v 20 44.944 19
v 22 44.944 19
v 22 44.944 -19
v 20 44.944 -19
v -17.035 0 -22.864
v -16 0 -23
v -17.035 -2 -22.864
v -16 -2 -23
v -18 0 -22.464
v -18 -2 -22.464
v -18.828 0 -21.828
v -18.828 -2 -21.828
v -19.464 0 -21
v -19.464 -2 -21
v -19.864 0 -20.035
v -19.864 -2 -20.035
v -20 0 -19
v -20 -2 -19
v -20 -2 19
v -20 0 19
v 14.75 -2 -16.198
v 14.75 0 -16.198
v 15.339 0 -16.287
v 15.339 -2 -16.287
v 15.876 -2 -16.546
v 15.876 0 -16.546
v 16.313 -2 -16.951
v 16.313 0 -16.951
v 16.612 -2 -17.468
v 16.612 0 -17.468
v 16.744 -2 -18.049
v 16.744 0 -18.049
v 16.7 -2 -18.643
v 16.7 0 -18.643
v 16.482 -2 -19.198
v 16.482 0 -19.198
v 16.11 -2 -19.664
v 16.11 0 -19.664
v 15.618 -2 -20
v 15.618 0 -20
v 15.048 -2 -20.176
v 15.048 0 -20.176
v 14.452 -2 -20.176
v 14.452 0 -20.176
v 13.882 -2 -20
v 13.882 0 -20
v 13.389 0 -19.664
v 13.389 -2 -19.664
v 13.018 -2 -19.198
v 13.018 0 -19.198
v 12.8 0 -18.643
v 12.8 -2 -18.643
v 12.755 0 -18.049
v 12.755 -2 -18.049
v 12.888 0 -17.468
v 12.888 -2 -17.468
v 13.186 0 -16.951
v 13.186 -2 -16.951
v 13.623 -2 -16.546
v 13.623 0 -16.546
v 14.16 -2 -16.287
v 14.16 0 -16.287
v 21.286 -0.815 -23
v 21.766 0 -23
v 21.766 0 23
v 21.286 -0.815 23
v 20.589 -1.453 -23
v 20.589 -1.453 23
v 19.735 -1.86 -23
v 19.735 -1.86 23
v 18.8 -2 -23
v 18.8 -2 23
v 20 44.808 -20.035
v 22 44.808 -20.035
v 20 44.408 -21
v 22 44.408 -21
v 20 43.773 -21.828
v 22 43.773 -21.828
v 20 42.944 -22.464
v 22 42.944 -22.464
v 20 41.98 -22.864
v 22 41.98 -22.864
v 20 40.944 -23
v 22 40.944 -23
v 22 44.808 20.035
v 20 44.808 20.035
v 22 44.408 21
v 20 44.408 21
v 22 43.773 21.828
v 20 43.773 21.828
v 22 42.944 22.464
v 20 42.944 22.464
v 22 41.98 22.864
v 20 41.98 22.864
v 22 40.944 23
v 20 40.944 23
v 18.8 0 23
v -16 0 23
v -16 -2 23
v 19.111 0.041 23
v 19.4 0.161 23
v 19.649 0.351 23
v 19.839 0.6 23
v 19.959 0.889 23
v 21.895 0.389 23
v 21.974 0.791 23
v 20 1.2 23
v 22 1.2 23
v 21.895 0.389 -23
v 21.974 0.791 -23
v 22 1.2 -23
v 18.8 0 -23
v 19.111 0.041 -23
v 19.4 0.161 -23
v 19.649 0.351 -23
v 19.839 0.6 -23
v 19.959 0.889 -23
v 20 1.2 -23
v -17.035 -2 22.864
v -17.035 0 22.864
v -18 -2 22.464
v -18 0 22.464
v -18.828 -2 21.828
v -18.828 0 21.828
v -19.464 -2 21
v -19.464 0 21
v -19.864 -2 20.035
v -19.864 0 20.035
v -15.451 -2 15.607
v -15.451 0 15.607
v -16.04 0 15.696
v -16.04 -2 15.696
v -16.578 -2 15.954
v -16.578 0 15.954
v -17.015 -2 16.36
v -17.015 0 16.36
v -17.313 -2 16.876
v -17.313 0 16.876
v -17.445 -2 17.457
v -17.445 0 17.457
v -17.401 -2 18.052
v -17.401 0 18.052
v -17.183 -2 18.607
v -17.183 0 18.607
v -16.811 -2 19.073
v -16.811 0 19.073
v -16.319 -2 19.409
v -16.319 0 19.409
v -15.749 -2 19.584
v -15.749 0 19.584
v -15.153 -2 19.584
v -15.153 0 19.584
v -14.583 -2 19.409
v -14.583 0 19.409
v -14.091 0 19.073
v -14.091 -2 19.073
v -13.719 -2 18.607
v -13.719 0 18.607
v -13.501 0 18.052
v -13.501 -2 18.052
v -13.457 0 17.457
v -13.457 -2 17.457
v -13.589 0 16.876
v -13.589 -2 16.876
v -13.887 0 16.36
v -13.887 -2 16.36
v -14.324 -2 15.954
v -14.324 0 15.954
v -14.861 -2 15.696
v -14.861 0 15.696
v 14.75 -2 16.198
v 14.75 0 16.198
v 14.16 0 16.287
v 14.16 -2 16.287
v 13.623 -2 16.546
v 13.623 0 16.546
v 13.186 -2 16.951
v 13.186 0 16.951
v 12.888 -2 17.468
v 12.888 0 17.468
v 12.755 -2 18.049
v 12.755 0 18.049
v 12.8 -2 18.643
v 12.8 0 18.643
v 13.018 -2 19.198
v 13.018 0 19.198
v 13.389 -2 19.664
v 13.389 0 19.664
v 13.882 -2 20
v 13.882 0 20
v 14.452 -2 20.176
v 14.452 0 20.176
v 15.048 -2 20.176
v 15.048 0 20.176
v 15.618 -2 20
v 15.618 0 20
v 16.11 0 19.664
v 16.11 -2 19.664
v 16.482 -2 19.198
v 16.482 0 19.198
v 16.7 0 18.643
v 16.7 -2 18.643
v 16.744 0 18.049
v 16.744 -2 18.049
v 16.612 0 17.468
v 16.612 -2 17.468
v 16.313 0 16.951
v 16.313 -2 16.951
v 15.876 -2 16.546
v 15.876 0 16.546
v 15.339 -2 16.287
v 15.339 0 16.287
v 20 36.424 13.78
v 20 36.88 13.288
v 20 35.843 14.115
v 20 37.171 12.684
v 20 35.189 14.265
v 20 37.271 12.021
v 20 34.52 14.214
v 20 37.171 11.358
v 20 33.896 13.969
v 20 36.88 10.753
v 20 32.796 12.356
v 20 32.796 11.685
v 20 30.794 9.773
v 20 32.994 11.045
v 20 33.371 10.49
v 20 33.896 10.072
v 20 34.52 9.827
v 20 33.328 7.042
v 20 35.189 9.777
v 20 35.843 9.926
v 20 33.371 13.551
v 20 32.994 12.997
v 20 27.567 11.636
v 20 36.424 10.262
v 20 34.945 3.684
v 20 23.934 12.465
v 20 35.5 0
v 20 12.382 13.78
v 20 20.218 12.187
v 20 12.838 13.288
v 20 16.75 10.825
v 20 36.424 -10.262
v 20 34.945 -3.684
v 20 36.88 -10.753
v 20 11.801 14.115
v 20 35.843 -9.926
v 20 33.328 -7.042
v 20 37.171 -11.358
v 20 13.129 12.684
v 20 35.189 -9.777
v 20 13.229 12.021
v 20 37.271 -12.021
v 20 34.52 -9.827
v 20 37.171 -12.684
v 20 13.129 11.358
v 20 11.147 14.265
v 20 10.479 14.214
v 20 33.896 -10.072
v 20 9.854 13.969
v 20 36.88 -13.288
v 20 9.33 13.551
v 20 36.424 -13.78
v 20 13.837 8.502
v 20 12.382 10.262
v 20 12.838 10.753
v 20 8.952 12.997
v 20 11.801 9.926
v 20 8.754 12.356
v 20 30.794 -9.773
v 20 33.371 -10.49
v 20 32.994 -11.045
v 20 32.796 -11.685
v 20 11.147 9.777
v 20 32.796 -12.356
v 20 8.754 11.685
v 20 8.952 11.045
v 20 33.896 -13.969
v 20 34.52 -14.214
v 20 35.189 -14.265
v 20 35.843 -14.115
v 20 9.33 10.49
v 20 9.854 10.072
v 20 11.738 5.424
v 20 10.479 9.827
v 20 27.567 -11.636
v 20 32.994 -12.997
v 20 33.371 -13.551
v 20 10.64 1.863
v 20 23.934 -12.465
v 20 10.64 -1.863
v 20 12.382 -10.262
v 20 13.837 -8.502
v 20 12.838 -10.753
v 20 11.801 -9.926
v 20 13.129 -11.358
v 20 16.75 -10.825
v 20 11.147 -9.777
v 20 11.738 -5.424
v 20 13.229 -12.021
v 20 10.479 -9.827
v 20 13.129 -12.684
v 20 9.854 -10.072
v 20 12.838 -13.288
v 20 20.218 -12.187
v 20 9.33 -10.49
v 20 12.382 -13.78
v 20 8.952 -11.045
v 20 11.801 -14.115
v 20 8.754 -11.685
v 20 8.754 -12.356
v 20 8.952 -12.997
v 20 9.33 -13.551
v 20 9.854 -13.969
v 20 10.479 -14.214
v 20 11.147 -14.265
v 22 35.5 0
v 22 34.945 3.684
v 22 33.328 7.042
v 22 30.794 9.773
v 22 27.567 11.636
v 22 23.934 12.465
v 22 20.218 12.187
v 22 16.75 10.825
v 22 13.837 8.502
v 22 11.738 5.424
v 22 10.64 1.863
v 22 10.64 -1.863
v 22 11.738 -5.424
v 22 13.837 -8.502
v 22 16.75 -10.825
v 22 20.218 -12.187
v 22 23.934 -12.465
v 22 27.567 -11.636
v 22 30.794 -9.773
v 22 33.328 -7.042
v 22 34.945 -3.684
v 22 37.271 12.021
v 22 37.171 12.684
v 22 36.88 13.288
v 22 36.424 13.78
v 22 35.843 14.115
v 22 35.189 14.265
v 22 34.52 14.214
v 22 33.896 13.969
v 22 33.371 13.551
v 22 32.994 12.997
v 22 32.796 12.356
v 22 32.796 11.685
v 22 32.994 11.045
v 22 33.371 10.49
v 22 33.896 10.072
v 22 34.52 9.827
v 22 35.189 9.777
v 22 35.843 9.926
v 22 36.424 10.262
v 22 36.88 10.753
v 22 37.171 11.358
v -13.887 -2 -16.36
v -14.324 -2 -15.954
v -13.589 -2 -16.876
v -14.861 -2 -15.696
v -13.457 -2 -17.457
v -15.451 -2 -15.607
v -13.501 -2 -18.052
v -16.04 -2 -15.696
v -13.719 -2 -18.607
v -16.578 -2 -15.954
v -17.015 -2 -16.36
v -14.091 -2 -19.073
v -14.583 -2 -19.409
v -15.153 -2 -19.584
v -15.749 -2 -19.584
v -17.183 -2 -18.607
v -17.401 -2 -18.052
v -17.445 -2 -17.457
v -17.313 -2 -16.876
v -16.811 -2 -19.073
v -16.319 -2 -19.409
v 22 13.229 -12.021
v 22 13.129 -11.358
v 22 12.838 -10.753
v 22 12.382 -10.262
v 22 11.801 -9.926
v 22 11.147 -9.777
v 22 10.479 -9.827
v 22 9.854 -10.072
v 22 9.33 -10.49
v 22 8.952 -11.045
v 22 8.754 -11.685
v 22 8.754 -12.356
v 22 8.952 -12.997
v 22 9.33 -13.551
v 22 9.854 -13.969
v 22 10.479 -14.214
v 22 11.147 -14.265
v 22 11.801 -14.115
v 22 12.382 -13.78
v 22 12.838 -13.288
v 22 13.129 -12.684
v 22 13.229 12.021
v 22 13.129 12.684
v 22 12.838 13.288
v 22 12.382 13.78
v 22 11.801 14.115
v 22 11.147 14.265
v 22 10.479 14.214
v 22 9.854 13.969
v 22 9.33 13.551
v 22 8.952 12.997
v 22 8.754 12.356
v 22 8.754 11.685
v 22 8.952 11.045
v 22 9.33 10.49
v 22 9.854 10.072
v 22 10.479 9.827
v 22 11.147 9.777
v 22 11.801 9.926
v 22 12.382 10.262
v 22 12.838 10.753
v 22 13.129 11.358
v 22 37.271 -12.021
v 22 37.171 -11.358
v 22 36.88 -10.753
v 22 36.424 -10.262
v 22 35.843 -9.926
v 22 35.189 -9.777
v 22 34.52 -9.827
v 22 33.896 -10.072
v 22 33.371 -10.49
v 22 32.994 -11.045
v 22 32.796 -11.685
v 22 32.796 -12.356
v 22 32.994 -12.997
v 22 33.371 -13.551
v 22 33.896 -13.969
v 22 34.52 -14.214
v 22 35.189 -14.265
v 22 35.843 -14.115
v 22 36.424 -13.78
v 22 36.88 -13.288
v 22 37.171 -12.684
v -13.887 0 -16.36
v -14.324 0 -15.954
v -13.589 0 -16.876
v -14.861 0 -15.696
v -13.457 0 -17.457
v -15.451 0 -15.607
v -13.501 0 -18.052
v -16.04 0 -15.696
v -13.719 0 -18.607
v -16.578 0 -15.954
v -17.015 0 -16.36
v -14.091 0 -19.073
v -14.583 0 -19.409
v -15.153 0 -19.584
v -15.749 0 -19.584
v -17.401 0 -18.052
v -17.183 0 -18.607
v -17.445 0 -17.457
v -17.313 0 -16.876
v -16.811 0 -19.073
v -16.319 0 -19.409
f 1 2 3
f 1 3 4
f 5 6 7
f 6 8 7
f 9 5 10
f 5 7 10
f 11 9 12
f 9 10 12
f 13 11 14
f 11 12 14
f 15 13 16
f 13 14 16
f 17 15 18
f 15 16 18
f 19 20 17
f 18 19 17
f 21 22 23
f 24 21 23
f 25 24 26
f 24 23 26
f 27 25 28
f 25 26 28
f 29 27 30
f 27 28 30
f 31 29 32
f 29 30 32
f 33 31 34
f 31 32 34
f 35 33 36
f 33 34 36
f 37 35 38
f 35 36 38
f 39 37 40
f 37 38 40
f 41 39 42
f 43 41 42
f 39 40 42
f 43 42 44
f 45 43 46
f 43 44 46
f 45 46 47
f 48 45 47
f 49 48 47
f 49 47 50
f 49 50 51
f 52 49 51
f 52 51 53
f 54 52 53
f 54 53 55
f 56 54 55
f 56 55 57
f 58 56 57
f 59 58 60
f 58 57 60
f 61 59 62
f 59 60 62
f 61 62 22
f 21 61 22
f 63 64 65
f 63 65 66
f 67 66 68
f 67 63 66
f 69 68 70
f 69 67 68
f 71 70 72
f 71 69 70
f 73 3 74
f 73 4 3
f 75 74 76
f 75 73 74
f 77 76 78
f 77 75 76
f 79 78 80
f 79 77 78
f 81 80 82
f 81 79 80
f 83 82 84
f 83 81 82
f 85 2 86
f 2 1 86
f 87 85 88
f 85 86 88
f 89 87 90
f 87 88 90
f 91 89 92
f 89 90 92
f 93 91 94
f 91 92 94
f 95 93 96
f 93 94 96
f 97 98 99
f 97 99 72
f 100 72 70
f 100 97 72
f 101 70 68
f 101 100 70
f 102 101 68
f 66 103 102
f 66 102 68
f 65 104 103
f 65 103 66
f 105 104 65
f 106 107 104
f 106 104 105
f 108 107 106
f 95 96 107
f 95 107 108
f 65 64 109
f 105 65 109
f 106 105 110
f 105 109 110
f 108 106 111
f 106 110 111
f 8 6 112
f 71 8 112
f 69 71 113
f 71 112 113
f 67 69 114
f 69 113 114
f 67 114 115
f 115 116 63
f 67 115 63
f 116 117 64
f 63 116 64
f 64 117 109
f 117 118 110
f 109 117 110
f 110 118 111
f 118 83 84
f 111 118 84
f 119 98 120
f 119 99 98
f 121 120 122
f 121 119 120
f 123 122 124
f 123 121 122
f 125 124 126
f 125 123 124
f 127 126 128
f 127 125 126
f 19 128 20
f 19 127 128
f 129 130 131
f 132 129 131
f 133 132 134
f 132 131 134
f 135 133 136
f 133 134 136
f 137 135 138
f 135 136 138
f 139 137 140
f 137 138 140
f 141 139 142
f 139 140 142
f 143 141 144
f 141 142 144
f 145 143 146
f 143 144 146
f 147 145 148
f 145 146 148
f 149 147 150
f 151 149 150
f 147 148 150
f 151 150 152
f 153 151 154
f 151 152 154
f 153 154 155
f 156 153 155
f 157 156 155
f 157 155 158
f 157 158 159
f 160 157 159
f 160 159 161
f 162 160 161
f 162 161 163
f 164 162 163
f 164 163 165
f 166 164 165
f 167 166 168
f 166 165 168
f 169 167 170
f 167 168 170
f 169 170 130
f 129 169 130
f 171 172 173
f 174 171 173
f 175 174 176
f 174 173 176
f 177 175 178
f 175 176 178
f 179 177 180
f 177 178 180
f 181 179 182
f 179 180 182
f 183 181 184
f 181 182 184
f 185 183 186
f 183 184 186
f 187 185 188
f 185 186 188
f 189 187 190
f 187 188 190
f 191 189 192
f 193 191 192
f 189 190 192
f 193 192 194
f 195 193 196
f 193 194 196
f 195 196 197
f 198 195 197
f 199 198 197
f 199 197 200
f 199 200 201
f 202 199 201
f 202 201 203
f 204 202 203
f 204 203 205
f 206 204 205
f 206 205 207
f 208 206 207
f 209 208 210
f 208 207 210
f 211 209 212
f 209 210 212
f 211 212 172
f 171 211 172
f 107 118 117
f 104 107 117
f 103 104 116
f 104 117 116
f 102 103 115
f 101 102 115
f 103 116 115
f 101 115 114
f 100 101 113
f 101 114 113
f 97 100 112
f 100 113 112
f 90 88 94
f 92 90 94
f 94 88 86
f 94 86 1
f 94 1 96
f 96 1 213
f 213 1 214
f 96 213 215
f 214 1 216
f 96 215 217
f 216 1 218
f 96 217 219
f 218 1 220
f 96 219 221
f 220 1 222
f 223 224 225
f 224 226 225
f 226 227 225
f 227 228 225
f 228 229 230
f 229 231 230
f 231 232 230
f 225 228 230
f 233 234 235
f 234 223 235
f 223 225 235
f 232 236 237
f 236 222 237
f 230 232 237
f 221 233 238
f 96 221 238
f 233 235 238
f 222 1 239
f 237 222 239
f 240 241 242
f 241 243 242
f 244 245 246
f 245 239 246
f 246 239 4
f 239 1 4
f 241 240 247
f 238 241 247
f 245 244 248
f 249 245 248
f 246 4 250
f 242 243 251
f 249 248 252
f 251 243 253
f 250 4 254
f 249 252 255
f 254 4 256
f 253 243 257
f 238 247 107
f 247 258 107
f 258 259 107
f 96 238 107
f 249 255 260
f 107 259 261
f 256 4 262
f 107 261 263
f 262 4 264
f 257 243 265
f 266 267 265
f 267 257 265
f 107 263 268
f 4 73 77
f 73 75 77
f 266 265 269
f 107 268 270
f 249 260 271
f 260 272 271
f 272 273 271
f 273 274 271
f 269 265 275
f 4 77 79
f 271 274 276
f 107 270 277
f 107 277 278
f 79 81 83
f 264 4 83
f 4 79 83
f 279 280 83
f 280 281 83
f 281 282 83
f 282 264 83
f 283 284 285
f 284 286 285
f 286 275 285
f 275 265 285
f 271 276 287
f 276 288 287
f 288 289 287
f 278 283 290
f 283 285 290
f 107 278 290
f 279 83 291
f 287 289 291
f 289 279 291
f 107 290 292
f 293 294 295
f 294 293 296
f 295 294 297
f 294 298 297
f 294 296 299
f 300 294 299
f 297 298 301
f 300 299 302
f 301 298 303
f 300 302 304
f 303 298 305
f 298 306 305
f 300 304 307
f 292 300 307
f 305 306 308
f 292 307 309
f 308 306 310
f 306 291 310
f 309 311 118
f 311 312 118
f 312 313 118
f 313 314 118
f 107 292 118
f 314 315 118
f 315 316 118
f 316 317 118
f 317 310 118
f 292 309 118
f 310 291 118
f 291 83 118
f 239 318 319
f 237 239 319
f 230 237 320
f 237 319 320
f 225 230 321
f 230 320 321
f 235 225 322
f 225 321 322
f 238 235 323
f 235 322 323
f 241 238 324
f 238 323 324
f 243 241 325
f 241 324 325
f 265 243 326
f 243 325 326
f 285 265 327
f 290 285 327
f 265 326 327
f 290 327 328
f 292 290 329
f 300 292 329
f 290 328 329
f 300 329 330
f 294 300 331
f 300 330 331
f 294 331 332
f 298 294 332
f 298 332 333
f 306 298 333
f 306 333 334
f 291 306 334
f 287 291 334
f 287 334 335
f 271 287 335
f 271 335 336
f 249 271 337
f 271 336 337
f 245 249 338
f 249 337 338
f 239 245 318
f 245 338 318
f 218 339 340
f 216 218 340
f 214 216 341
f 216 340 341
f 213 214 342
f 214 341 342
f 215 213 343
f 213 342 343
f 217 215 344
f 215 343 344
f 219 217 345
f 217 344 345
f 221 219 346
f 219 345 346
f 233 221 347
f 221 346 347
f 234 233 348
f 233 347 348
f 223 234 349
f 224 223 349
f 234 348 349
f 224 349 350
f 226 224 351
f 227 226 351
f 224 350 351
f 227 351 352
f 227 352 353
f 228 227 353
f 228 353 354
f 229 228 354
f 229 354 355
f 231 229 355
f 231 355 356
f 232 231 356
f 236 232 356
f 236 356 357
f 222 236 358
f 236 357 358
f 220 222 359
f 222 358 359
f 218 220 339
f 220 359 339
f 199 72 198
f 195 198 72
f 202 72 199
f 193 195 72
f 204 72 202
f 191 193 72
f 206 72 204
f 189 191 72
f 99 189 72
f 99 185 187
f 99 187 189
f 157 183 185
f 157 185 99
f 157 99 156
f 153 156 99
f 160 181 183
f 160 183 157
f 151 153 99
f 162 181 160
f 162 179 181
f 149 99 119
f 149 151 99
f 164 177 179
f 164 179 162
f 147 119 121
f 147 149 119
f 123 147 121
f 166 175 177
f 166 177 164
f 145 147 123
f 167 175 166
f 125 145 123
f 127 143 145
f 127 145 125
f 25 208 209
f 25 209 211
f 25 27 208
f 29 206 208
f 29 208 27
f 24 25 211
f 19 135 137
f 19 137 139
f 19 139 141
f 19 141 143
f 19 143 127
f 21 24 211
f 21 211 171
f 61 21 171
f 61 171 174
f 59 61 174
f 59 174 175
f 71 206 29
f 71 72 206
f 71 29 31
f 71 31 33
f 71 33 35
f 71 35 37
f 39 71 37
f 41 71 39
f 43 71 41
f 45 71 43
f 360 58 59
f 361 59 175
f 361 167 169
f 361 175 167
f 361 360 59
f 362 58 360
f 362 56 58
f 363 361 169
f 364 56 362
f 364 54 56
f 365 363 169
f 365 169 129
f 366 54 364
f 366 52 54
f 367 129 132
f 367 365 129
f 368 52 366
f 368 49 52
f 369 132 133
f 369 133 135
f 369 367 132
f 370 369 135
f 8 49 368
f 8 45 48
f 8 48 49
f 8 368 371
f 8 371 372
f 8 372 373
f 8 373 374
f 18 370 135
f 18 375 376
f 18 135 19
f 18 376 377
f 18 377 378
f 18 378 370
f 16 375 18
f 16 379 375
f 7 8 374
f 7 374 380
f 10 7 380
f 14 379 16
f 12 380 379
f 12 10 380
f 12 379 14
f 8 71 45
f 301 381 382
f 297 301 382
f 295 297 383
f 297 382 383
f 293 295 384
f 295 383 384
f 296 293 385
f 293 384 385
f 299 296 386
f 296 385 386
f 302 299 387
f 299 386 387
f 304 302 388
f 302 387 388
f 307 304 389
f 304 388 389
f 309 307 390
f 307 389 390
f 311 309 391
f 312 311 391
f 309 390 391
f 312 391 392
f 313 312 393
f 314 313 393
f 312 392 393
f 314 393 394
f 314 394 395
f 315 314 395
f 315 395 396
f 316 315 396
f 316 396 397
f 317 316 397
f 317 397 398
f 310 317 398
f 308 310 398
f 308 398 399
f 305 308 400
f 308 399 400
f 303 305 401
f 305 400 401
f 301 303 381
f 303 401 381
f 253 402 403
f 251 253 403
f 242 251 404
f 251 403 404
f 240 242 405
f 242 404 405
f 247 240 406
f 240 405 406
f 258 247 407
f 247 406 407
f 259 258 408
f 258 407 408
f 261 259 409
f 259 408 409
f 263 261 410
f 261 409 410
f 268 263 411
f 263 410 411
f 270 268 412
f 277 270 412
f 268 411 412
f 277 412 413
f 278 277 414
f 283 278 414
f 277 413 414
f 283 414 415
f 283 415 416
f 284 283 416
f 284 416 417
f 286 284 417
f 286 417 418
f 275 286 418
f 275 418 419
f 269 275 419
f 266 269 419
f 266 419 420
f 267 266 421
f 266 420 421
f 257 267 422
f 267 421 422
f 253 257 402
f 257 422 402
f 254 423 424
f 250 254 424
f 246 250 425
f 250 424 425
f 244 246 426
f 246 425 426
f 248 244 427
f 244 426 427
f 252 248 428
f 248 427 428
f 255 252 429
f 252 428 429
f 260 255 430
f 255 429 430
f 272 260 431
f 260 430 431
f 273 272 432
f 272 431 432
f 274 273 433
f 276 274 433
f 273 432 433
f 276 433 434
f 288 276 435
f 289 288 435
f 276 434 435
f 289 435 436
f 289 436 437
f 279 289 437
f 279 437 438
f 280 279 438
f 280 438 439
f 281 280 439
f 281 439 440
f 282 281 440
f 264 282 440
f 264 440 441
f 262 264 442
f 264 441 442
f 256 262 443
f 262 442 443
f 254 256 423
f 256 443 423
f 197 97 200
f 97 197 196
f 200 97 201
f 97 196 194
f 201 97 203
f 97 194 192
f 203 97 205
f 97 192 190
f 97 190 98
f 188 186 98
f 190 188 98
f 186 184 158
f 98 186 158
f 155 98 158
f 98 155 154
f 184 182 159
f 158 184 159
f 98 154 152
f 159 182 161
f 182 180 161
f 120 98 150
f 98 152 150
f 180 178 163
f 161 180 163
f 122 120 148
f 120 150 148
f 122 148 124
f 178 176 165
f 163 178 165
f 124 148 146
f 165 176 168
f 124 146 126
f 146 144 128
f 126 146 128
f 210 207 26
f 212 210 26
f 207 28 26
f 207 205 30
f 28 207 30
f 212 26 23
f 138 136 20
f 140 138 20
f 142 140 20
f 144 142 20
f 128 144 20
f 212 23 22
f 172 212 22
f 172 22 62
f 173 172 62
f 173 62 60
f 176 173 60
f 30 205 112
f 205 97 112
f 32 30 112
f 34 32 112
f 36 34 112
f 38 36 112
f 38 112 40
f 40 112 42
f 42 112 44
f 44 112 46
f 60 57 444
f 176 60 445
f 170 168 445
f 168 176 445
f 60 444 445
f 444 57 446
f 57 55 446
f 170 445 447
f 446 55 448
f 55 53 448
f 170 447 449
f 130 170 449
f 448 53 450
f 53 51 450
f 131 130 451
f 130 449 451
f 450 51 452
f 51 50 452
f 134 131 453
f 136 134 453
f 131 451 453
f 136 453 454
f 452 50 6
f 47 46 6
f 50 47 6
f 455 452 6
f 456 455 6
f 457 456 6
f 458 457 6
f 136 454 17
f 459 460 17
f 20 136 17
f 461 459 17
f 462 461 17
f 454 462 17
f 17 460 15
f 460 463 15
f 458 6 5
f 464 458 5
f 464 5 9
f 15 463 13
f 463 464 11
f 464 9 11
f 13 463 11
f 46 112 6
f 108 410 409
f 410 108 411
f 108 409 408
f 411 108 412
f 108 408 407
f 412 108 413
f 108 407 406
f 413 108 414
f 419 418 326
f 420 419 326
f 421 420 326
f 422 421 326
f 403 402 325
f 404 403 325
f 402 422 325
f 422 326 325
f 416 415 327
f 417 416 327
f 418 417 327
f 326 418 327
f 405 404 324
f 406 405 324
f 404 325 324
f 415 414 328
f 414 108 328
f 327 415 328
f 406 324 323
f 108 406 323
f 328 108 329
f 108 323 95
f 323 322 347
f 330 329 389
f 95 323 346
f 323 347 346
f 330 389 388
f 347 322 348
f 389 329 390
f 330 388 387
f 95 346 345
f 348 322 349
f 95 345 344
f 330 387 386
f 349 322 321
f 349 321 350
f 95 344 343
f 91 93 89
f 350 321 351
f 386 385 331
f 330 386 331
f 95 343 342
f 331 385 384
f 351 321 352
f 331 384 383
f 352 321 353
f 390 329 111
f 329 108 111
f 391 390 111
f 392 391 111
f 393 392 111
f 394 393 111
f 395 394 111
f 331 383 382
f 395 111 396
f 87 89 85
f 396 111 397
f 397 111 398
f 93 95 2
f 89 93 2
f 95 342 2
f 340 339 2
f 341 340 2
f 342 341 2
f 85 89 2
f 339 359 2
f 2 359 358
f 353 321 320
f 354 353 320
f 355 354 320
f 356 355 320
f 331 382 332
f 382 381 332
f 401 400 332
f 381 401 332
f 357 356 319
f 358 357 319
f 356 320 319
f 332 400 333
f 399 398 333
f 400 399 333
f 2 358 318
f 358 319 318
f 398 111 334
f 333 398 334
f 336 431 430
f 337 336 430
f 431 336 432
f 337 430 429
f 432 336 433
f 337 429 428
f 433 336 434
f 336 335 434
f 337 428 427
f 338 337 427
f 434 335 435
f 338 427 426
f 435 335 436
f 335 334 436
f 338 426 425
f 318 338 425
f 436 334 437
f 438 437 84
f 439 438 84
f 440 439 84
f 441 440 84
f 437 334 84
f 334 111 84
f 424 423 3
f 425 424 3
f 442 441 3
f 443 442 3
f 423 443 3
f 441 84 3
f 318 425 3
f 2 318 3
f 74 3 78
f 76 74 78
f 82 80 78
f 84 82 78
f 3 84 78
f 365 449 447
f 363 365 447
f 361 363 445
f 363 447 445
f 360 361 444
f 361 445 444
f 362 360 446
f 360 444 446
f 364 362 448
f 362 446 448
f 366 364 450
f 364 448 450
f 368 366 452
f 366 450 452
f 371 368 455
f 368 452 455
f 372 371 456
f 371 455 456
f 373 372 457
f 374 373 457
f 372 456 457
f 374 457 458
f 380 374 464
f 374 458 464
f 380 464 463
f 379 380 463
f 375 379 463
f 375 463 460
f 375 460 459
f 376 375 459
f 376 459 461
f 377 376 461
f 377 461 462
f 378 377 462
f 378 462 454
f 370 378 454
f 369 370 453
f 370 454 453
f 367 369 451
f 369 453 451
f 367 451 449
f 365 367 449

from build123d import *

# Parameters (mm, degrees)
BASE_FLANGE1_DEPTH     = 2
SKETCHED_START         = -23
SKETCHED_BEND1_DEPTH   = 46
SKETCHED_BEND1_2_DEPTH = 46
SKETCH7_R              = 12.5
SKETCH7_R_2            = 2.25
CUT_EXTRUDE1_DEPTH     = 2
SKETCH8_R              = 2
CUT_EXTRUDE2_DEPTH     = 2
FILLET1_R              = 4


# Read off the part's stored shape, not the designer's step: Sketched Bend1
# Sheet-metal steps are written as plain solids
with BuildPart() as part:
    # Sketch1 → Base-Flange1 (new body)
    with BuildSketch(Plane(origin=(0, 0, 0), x_dir=(1, 0, 0), z_dir=(0, 1, 0))):
        Polygon((-20, 23), (20, 23), (66, 23), (66, -23), (20, -23), (-20, -23), align=None)
    extrude(amount=-BASE_FLANGE1_DEPTH)

    # Sketched Bend1 outline → Sketched Bend1 (cut)
    with BuildSketch(Plane.XY.offset(SKETCHED_START)):
        with BuildLine():
            Line((66, 0), (21.766479395, 0))
            ThreePointArc((21.766479395, 0), (20.588854382, -1.453299832), (18.8, -2))
            Line((18.8, -2), (66, -2))
            Line((66, -2), (66, 0))
        make_face()
    extrude(amount=SKETCHED_BEND1_DEPTH, mode=Mode.SUBTRACT)

    # Sketched Bend1 2 outline → Sketched Bend1 2 (add)
    with BuildSketch(Plane.XY.offset(SKETCHED_START)):
        with BuildLine():
            Line((20, 44.944248081), (20, 1.2))
            ThreePointArc((20, 1.2), (19.648528137, 0.351471863), (18.8, 0))
            Line((18.8, 0), (21.766479395, 0))
            ThreePointArc((21.766479395, 0), (21.941077368, 0.58874476), (22, 1.2))
            Line((22, 1.2), (22, 44.944248081))
            Line((22, 44.944248081), (20, 44.944248081))
        make_face()
    extrude(amount=SKETCHED_BEND1_2_DEPTH)

    # Sketch7 → Cut-Extrude1 (cut)
    with BuildSketch(Plane(origin=(22, 0, 0), x_dir=(0, 0, -1), z_dir=(1, 0, 0))):
        with Locations(Location((0, 23, 0), (0, 0, 90))):
            Circle(SKETCH7_R)
        with Locations(Location((12.02081528, 35.02081528, 0), (0, 0, 90))):
            Circle(SKETCH7_R_2)
        with Locations(Location((12.02081528, 10.97918472, 0), (0, 0, 90))):
            Circle(SKETCH7_R_2)
        with Locations(Location((-12.02081528, 10.97918472, 0), (0, 0, 90))):
            Circle(SKETCH7_R_2)
        with Locations(Location((-12.02081528, 35.02081528, 0), (0, 0, 90))):
            Circle(SKETCH7_R_2)
    extrude(amount=-CUT_EXTRUDE1_DEPTH, mode=Mode.SUBTRACT)

    # Sketch8 → Cut-Extrude2 (cut)
    with BuildSketch(Plane(origin=(0, 0, 0), x_dir=(1, 0, 0), z_dir=(0, 1, 0))):
        with Locations(Location((-15.450942979, 17.606788068, 0), (0, 0, 270))):
            Circle(SKETCH8_R)
        with Locations(Location((-15.450942979, -17.606788068, 0), (0, 0, 90))):
            Circle(SKETCH8_R)
        with Locations(Location((14.749785428, 18.198199219, 0), (0, 0, 270))):
            Circle(SKETCH8_R)
        with Locations(Location((14.749785428, -18.198199219, 0), (0, 0, 90))):
            Circle(SKETCH8_R)
    extrude(amount=-CUT_EXTRUDE2_DEPTH, mode=Mode.SUBTRACT)

    # Fillet1
    fillet1_edges = [part.edges().sort_by_distance(p)[0] for p in [
        (21, 44.944248081, -23),
        (21, 44.944248081, 23),
        (-20, -1, 23),
        (-20, -1, -23),
    ]]
    fillet(fillet1_edges, radius=FILLET1_R)


solid = part.part
